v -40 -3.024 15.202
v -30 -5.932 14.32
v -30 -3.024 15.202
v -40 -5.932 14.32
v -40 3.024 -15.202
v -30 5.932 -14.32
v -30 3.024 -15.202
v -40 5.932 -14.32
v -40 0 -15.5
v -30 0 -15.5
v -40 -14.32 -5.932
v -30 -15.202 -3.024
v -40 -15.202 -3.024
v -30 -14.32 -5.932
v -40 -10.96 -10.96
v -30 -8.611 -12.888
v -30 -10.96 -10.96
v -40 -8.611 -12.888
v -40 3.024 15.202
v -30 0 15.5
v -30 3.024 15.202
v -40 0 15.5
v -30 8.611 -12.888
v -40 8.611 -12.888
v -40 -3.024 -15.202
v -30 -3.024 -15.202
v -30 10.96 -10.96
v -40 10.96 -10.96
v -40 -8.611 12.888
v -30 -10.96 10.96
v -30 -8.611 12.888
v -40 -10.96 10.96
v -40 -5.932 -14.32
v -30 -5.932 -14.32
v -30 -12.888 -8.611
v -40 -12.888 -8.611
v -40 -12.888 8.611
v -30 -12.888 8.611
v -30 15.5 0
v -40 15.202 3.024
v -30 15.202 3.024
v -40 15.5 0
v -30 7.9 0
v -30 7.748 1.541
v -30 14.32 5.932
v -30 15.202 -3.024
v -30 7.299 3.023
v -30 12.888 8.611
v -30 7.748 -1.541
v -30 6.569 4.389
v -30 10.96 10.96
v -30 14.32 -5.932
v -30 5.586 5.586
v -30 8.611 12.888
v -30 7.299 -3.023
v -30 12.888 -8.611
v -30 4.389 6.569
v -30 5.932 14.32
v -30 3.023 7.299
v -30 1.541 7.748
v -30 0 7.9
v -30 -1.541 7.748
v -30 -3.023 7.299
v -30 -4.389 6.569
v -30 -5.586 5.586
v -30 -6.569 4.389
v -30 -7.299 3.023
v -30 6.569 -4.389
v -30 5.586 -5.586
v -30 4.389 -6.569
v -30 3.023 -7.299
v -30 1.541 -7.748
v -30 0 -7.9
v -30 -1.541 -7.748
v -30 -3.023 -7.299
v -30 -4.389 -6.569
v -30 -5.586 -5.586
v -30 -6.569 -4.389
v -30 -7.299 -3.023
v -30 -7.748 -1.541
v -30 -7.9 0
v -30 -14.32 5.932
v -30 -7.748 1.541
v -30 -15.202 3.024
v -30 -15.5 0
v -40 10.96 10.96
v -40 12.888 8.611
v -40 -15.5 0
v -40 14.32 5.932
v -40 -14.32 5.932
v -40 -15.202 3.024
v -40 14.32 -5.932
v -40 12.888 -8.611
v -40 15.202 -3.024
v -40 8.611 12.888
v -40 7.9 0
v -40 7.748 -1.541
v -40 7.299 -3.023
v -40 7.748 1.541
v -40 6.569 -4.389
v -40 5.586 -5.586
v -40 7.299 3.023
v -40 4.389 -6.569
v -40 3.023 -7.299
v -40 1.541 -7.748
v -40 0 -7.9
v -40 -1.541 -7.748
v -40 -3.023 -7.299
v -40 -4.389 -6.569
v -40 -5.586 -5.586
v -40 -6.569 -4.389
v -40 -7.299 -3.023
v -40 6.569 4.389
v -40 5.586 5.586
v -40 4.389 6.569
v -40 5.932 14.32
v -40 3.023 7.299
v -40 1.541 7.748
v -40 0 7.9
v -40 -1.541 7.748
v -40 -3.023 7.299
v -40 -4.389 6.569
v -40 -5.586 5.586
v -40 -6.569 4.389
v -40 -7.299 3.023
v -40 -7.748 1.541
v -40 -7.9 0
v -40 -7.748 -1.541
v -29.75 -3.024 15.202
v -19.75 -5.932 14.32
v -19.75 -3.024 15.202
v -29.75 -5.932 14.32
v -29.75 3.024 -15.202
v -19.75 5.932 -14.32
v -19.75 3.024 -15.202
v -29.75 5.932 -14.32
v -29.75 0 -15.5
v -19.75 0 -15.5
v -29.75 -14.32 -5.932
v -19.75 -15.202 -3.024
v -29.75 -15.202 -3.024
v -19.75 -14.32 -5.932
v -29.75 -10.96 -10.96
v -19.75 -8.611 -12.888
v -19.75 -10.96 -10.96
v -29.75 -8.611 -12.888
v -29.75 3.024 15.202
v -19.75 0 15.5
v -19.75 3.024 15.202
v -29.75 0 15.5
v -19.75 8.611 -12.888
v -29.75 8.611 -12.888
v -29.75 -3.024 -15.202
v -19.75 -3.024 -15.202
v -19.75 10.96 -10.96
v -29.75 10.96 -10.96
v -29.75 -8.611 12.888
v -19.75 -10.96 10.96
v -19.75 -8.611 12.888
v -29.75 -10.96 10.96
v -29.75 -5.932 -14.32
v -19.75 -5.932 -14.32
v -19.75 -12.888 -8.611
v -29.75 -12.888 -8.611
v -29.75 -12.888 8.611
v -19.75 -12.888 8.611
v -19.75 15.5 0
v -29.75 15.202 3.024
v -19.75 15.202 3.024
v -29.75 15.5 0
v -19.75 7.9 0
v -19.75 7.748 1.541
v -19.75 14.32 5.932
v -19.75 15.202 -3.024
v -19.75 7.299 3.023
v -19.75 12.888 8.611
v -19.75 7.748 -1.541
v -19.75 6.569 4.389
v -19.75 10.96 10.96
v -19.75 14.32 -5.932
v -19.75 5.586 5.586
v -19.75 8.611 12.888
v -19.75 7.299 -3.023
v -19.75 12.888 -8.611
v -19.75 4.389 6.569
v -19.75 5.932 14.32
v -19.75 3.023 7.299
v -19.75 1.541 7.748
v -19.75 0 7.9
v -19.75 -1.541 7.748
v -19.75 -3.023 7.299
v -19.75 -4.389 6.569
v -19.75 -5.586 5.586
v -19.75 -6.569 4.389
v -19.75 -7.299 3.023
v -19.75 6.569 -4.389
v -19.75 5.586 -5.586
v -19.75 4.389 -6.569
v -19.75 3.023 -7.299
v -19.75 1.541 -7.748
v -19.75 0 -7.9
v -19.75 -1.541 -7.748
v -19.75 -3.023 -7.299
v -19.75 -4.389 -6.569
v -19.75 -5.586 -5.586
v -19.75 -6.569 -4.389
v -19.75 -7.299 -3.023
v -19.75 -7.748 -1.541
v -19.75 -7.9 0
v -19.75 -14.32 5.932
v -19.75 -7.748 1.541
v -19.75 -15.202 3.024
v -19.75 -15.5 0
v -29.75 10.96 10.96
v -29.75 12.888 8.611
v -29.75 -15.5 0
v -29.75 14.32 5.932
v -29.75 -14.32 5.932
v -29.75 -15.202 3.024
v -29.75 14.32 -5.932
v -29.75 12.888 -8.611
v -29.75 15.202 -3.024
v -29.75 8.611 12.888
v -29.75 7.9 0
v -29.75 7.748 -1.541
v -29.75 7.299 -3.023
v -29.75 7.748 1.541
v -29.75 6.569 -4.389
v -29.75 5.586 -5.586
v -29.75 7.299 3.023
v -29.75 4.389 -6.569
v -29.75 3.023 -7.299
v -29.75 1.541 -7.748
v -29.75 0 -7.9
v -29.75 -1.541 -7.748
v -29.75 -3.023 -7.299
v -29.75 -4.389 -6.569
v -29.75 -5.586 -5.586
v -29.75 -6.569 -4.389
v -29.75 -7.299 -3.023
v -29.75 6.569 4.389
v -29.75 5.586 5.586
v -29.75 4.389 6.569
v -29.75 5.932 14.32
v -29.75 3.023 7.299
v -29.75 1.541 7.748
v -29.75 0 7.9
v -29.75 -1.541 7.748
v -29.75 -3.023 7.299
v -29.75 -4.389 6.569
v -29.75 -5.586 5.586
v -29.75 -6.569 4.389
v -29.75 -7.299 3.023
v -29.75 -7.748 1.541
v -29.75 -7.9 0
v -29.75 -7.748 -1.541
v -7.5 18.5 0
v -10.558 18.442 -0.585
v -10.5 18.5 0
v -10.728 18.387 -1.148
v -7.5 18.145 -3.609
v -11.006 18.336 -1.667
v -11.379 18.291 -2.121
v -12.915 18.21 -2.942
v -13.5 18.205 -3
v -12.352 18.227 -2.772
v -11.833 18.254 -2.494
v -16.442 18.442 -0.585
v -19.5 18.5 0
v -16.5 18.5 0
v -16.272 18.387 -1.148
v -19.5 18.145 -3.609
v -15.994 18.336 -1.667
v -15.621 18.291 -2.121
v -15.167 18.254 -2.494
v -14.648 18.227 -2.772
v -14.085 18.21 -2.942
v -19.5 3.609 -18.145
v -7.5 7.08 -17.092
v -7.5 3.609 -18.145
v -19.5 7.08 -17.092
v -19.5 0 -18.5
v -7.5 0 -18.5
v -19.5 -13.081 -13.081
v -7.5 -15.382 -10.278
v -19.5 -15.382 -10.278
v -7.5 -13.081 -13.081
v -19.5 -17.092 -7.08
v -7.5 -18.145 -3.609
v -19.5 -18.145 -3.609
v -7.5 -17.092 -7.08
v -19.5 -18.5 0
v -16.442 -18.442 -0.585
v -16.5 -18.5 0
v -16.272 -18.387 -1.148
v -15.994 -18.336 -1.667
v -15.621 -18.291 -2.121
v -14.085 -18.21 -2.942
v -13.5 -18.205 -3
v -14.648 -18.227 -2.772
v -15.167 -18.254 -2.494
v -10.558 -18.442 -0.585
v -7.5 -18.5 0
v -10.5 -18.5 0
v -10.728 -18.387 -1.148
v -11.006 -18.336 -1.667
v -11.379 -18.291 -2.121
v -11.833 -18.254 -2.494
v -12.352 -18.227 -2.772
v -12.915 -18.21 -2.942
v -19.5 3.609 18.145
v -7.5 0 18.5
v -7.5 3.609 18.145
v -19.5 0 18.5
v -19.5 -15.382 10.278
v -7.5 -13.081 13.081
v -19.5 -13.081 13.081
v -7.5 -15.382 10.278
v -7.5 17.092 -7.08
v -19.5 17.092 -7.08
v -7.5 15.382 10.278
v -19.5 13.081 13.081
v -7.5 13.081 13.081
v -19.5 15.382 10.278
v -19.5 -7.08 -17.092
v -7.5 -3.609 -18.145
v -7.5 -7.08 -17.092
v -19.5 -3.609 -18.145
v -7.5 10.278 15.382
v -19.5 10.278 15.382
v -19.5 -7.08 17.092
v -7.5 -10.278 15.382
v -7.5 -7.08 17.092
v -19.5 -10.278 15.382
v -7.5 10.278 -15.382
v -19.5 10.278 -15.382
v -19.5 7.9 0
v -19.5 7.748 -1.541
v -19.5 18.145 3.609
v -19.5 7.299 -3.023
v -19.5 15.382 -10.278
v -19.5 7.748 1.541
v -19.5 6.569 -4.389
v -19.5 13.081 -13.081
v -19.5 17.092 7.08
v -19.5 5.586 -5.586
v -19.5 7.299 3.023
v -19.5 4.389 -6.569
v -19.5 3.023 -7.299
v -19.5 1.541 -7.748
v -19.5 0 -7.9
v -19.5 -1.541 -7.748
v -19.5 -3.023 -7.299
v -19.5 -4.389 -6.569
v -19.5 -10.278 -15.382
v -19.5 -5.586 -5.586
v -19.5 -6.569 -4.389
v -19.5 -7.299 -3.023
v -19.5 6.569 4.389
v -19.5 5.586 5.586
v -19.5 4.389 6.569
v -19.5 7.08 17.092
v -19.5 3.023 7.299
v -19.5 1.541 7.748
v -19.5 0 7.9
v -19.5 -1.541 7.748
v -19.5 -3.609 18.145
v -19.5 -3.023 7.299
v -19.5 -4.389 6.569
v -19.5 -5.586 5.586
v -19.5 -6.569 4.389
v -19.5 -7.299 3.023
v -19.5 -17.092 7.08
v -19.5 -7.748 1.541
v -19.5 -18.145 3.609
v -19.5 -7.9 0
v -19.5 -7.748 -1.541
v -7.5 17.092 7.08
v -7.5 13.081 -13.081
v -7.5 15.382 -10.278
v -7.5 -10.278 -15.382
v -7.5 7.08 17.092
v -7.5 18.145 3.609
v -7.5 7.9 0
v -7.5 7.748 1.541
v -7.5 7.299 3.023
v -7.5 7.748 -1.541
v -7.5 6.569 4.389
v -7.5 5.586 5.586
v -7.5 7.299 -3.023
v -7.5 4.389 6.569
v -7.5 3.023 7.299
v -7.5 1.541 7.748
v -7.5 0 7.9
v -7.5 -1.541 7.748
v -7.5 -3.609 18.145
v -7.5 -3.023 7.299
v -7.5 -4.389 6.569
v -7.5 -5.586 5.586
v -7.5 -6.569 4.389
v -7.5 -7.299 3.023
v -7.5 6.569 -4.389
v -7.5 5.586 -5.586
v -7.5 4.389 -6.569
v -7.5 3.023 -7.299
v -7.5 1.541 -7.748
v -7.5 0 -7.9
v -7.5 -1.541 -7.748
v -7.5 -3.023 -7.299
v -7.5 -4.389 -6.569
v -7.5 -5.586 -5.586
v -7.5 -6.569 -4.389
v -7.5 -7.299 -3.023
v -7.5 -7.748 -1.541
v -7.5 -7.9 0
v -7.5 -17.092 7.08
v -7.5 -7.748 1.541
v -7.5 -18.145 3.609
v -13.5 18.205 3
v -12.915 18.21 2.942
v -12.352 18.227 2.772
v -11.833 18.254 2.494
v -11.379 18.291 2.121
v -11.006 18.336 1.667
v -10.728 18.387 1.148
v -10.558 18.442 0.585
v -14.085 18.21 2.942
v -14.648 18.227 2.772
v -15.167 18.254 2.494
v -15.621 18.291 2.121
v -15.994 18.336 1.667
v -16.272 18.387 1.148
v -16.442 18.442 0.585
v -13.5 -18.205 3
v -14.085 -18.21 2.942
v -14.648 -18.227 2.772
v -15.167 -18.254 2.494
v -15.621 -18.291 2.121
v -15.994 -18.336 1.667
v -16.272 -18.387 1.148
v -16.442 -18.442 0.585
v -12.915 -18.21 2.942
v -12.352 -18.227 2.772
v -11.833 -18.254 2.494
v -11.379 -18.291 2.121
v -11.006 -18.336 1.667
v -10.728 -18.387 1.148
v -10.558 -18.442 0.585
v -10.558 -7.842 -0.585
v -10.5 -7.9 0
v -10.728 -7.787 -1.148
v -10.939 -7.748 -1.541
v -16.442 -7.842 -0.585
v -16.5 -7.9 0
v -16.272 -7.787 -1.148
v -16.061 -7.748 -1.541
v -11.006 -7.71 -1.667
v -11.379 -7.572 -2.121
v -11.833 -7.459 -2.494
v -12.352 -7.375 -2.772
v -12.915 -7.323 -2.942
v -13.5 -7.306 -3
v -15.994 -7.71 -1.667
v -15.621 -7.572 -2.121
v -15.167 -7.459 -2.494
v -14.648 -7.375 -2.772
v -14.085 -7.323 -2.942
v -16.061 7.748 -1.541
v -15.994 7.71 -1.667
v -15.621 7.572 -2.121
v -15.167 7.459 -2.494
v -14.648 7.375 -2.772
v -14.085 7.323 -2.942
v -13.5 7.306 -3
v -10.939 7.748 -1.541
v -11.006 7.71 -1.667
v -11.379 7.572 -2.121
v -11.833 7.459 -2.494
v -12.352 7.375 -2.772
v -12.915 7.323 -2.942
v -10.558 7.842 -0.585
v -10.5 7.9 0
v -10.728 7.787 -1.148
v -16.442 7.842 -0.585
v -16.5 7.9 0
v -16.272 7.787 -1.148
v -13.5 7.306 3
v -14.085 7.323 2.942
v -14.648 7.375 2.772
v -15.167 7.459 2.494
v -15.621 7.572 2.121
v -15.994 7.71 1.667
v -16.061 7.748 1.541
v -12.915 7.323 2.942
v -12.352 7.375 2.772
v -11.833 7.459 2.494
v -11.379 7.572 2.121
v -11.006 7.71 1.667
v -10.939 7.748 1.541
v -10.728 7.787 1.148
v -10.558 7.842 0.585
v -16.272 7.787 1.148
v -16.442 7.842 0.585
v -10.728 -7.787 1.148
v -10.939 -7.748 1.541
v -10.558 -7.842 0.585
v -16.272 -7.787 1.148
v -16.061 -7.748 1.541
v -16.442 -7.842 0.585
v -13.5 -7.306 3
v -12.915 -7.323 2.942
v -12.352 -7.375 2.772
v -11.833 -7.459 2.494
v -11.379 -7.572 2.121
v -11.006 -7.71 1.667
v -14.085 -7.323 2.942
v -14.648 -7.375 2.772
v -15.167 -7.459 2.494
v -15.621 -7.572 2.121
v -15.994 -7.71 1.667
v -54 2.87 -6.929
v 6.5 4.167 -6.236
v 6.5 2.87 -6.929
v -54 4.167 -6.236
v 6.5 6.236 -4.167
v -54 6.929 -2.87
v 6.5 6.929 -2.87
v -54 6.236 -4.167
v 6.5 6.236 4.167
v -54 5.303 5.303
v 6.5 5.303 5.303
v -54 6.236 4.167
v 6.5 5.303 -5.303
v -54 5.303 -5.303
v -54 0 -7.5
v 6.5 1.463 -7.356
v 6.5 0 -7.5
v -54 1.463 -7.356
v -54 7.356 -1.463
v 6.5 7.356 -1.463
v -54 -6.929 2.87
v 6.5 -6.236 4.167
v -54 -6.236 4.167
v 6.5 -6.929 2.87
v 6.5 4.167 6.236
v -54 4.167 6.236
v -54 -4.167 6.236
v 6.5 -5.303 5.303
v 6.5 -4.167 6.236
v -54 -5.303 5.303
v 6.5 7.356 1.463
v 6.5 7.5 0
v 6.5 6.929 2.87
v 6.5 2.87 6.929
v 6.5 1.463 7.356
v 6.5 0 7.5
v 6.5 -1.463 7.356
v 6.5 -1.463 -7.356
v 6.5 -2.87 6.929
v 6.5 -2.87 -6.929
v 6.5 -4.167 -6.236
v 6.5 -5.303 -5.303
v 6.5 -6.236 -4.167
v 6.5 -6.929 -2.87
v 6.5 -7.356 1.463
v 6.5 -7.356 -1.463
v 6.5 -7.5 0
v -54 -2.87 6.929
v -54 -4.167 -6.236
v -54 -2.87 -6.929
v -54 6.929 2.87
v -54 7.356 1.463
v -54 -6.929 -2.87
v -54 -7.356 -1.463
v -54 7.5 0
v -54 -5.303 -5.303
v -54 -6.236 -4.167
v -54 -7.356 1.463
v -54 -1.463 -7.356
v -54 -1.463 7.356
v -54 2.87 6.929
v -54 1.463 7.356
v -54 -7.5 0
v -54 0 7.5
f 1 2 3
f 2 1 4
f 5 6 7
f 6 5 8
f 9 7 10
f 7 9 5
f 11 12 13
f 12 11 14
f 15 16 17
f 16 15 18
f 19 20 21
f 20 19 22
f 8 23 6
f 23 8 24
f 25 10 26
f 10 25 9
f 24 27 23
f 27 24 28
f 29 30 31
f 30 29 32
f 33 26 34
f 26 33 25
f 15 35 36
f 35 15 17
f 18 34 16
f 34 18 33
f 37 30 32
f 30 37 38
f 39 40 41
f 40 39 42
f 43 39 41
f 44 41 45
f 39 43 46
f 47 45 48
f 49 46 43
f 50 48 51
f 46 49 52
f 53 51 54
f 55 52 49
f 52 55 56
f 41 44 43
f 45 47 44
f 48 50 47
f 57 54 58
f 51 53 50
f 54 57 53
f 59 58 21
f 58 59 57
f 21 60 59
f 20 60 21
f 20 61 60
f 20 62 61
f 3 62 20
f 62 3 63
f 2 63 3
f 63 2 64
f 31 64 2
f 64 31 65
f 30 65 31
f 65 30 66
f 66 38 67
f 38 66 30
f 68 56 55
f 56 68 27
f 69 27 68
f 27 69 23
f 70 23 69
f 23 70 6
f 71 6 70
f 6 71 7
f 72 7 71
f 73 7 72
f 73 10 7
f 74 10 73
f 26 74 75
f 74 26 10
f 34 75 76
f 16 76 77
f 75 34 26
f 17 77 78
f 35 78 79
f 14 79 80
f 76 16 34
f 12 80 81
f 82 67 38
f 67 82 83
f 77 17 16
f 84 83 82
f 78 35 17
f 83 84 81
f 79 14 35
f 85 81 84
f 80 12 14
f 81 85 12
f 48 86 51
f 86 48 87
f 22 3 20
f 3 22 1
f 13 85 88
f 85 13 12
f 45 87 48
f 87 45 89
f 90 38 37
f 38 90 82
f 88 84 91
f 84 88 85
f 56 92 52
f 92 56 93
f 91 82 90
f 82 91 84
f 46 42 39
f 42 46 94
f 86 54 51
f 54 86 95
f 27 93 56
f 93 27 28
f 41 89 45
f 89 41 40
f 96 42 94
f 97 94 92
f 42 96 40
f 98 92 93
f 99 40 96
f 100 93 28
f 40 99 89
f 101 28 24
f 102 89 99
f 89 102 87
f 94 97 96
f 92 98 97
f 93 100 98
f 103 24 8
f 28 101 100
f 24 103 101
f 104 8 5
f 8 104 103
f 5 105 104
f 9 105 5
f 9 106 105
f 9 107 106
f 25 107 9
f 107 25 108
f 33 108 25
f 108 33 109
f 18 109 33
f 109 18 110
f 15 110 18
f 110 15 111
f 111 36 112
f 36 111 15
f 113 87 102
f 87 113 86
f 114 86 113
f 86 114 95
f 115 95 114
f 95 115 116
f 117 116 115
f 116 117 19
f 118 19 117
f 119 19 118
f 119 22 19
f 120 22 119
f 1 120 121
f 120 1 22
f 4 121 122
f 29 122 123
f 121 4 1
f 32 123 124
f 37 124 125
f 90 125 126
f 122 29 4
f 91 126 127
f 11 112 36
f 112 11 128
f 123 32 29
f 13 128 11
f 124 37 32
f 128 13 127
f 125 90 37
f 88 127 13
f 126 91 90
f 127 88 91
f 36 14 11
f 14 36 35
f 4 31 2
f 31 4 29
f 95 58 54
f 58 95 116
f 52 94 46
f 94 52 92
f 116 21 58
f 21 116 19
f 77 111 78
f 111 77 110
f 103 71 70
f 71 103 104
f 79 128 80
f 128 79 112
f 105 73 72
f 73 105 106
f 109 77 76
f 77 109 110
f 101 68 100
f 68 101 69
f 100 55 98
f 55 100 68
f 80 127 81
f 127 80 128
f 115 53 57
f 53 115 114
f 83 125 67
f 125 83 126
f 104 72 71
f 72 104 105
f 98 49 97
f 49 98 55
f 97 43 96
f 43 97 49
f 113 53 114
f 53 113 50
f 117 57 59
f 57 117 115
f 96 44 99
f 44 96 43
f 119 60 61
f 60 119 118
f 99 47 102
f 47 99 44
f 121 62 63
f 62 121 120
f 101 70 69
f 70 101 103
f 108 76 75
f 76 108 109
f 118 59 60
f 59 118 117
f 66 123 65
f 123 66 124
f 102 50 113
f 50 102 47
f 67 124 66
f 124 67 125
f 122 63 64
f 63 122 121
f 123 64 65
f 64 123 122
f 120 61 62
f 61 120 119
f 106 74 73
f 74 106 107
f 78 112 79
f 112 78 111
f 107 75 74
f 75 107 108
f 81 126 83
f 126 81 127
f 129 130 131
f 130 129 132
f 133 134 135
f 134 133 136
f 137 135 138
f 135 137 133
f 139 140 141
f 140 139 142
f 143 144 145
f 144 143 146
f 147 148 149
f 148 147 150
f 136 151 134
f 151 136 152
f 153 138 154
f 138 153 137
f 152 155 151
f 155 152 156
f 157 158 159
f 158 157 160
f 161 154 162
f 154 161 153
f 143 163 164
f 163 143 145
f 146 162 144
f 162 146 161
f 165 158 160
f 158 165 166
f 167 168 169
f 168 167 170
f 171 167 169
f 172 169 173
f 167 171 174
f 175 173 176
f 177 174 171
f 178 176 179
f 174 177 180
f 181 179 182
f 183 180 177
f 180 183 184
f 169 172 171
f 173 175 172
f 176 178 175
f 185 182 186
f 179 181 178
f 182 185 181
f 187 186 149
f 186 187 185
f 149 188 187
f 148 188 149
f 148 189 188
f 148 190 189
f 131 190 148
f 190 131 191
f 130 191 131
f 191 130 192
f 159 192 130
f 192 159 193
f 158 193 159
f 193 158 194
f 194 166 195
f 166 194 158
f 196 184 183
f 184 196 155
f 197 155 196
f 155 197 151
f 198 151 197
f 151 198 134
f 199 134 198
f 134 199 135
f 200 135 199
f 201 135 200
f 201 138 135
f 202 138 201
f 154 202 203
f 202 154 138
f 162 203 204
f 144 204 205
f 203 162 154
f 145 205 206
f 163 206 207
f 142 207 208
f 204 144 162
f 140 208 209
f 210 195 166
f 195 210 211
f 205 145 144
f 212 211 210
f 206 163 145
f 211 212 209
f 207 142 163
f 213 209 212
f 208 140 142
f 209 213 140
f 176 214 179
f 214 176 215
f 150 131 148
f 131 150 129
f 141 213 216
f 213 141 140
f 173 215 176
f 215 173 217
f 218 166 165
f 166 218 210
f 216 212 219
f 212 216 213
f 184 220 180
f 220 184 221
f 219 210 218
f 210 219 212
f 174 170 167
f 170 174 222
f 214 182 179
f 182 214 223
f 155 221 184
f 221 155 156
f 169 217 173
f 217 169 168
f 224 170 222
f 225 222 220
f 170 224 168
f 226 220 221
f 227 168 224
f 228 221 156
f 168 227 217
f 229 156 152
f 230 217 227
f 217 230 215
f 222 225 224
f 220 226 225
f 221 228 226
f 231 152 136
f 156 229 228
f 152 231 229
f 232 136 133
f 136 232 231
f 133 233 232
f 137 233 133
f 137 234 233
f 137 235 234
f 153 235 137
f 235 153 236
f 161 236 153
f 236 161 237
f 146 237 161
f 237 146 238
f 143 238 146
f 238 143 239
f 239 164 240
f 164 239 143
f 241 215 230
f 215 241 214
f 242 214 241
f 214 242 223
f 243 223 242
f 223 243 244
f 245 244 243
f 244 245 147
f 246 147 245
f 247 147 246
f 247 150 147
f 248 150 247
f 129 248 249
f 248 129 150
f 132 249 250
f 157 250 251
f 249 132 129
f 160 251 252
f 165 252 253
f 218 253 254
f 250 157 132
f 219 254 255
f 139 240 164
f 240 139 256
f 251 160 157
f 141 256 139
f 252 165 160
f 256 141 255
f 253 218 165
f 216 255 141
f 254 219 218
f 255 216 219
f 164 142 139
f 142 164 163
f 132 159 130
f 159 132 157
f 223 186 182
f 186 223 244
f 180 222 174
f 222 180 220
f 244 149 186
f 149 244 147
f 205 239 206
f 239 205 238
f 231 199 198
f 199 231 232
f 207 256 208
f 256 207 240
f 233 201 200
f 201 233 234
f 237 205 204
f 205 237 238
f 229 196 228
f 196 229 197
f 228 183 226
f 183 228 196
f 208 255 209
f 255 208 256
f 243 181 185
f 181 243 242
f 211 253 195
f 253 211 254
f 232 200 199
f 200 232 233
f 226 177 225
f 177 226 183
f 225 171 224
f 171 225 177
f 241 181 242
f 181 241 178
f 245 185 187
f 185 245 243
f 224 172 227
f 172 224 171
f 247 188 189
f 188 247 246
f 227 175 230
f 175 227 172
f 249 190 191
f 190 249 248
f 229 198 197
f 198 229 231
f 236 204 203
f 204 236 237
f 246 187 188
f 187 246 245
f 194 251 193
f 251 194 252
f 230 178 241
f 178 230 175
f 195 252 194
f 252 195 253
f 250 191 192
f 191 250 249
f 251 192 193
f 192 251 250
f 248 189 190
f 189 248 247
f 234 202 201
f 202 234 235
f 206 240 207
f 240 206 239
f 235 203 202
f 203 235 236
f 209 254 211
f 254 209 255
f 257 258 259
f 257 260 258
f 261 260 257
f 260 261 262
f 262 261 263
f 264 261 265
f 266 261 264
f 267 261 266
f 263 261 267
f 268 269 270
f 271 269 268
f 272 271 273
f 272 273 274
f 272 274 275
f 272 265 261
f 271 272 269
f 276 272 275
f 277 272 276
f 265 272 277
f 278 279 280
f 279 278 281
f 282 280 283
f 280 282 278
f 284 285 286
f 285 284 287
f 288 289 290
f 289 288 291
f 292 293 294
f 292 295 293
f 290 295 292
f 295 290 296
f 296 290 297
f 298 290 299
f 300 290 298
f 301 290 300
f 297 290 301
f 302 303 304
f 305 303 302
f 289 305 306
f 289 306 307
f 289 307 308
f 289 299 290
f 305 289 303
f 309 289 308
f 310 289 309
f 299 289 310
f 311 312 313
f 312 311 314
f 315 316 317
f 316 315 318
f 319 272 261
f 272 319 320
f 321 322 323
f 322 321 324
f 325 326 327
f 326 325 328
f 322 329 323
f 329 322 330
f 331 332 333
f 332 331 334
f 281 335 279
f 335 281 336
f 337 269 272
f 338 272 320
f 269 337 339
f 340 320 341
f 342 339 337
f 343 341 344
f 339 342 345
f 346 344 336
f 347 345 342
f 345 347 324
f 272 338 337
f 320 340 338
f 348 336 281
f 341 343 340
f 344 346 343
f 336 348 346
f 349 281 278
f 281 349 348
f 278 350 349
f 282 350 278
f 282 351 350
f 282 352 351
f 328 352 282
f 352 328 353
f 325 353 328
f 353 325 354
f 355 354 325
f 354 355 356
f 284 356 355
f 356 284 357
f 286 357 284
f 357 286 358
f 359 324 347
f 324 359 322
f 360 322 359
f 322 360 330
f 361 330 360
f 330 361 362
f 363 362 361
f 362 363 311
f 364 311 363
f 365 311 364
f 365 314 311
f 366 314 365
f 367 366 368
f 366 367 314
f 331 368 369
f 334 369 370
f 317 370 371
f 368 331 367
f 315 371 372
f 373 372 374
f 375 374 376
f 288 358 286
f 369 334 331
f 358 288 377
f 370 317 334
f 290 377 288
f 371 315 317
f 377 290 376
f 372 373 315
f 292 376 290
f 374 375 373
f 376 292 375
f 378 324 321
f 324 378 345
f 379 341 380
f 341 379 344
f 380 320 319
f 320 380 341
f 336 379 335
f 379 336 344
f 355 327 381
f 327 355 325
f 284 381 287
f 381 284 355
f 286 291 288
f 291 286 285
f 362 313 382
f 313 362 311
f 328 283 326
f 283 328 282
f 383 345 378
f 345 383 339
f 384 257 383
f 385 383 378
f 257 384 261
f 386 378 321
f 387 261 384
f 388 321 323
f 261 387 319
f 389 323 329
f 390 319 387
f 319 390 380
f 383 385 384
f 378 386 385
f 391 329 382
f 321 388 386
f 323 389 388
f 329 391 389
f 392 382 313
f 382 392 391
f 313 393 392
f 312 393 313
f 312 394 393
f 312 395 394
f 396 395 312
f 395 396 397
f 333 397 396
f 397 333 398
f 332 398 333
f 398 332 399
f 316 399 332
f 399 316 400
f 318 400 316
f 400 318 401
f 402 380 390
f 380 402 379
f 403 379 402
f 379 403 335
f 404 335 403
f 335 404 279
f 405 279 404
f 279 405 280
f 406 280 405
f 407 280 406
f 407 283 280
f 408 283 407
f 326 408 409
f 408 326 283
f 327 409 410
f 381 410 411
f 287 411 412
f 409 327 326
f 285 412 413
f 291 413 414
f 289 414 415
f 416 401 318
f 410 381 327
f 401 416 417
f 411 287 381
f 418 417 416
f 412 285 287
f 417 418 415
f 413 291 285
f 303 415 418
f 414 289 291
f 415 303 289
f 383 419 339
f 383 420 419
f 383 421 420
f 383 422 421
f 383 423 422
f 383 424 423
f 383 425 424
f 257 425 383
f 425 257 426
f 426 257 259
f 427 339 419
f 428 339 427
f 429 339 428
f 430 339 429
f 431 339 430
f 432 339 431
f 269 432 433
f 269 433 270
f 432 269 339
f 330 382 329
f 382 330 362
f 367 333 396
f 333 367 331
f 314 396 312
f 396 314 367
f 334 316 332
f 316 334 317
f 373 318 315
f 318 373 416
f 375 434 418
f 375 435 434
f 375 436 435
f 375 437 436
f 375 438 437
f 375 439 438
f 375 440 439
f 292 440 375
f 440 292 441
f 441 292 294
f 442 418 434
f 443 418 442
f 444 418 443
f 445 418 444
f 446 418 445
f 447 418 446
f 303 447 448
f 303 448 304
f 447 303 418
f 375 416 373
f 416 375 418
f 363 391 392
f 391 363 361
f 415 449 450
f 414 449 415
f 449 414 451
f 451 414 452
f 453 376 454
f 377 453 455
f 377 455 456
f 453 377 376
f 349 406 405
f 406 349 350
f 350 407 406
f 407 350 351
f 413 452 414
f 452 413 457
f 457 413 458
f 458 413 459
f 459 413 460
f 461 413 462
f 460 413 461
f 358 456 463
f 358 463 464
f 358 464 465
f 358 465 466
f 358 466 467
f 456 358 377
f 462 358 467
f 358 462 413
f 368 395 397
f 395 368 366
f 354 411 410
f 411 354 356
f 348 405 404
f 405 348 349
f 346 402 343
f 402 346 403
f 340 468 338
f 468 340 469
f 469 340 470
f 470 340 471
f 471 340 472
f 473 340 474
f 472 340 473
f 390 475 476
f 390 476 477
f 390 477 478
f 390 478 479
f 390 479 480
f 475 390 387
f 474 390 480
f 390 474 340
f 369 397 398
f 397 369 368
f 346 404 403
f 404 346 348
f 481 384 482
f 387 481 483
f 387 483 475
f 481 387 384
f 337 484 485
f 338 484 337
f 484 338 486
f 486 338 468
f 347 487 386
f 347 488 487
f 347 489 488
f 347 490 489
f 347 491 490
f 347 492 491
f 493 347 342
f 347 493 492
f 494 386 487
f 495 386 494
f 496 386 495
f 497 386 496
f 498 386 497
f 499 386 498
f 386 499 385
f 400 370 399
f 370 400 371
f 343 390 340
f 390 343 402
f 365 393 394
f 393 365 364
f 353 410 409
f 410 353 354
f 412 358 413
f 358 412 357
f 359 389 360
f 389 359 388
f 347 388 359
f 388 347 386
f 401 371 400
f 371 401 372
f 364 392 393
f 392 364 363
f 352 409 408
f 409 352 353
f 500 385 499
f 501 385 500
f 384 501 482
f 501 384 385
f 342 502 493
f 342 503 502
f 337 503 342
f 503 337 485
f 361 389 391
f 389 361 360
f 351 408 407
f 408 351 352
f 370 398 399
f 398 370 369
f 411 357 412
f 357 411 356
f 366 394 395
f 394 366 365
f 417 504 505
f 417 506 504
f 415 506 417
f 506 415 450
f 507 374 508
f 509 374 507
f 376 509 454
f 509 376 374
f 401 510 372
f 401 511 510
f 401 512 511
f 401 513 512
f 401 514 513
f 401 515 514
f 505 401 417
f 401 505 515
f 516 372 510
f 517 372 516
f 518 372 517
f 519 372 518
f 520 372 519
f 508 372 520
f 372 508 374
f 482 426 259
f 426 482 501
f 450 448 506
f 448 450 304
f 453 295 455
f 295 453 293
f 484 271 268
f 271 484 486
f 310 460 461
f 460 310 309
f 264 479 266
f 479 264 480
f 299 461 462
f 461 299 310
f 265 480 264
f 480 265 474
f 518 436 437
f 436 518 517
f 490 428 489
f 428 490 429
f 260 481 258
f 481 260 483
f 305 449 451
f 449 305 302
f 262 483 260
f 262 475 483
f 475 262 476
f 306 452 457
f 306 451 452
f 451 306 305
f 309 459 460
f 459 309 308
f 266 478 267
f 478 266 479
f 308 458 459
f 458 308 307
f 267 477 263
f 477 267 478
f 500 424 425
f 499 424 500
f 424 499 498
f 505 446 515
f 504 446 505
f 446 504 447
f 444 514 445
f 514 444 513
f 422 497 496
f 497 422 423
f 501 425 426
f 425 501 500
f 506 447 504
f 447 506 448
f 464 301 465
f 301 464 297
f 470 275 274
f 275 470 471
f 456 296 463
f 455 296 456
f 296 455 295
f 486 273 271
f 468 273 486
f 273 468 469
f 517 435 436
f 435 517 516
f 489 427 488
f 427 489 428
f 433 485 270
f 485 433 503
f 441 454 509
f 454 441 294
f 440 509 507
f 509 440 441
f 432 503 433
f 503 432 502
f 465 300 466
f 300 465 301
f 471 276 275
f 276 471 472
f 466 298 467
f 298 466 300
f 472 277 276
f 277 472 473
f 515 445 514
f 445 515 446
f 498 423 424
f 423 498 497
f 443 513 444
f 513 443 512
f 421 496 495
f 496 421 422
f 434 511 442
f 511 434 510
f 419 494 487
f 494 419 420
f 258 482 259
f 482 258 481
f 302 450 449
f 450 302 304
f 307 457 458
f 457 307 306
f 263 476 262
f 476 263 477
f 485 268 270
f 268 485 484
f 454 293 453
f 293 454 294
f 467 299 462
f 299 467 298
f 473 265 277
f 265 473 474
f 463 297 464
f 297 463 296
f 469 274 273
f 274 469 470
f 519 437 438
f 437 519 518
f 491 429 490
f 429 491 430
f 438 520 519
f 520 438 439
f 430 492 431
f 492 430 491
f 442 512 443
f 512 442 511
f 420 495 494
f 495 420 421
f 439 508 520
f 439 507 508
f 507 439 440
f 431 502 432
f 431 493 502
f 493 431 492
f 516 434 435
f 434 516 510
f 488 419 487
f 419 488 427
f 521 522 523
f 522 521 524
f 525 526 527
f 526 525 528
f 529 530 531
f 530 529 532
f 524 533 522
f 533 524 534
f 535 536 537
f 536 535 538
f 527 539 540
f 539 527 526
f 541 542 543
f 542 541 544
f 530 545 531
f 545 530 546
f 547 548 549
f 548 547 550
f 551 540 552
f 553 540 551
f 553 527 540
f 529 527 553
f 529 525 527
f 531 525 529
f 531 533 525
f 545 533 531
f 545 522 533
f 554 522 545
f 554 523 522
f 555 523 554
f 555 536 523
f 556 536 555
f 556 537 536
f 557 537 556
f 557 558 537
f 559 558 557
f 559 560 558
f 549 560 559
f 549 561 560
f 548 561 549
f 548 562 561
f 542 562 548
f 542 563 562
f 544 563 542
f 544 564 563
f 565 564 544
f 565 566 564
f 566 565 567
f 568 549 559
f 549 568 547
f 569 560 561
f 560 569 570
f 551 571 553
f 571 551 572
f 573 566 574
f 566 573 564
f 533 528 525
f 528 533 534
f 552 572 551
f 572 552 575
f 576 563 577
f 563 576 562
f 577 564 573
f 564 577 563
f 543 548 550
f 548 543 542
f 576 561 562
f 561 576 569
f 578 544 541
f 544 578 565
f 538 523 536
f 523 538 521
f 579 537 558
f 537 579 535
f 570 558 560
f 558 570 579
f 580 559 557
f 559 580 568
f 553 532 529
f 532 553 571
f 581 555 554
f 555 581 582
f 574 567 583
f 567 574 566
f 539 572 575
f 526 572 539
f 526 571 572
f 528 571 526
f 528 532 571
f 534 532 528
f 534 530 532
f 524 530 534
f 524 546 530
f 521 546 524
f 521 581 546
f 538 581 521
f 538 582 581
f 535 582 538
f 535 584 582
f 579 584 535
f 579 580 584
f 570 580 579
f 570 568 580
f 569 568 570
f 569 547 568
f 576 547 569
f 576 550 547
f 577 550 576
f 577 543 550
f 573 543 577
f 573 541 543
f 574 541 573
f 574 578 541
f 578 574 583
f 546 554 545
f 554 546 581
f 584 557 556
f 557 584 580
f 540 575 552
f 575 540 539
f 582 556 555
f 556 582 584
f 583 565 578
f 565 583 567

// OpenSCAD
$fn = 32;

// ------------------------------------------------------------------------
// Shaft with rings and collars: d15 shaft, 3 rings
// Every part is its own module, assembly() places them once.
// ------------------------------------------------------------------------

// --- part 1 ---
module shaft() {
  translate([0, 0, -30.25]) cylinder(h = 60.5, d = 15);
}

// --- part 2 ---
module spacer_a() {
  difference() {
      translate([0, 0, 0]) cylinder(h = 10, d = 31);
      translate([0, 0, -1]) cylinder(h = 12, d = 15.8);
    }
}

// --- part 3 ---
module spacer_b() {
  difference() {
      translate([0, 0, 0]) cylinder(h = 10, d = 31);
      translate([0, 0, -1]) cylinder(h = 12, d = 15.8);
    }
}

// --- part 4 ---
module collar_a() {
  difference() {
    cylinder(h = 12, d = 37);
    translate([0, 0, -1]) cylinder(h = 14, d = 15.8);
    translate([0, 0, 6]) rotate([90, 0, 0]) cylinder(h = 39, d = 6, center = true);
  }
}

// --- assembly ---
module assembly() {
  translate([-23.75, 0, 0]) rotate([0, 90, 0]) shaft();
  translate([-40, 0, 0]) rotate([0, 90, 0]) spacer_a();
  translate([-29.75, 0, 0]) rotate([0, 90, 0]) spacer_b();
  translate([-19.5, 0, 0]) rotate([0, 90, 0]) collar_a();
}

assembly();
